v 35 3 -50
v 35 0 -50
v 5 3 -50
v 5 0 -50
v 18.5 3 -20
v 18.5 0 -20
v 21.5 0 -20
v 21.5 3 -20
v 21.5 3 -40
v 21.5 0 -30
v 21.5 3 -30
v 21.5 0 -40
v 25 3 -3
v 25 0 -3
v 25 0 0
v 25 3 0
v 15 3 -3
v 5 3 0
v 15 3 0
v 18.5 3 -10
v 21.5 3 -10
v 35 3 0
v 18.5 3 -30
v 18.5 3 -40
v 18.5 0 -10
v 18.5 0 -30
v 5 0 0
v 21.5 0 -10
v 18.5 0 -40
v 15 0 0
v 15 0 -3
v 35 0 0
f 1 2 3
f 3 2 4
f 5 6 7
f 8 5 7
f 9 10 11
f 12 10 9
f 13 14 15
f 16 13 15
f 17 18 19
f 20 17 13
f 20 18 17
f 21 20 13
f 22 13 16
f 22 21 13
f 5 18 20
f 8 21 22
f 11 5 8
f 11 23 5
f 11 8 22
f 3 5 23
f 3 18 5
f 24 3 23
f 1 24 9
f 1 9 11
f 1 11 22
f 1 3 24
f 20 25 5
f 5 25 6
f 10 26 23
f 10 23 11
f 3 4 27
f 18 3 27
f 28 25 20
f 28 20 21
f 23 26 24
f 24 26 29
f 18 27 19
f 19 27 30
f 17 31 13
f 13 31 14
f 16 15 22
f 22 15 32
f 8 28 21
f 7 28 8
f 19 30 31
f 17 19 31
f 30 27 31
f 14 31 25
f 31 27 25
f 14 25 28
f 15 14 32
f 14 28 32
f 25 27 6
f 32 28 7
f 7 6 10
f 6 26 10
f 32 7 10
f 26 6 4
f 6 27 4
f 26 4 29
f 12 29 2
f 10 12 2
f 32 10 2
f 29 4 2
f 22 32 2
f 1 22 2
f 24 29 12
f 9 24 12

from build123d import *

# Parameters (mm, degrees)
CROQUIS1_W              = 3
CROQUIS1_H              = 10
SALIENTE_EXTRUIR1_DEPTH = 3


with BuildPart() as part:
    # Croquis1 → Saliente-Extruir1 (new body)
    with BuildSketch(Plane(origin=(0, 0, 0), x_dir=(1, 0, 0), z_dir=(0, 1, 0))):
        Polygon((25, 0), (35, 0), (35, 50), (5, 50), (5, 0), (15, 0), (15, 3), (25, 3), align=None)
        with Locations((20, 15)):
            Rectangle(CROQUIS1_W, CROQUIS1_H, mode=Mode.SUBTRACT)
        with Locations((20, 35)):
            Rectangle(CROQUIS1_W, CROQUIS1_H, mode=Mode.SUBTRACT)
    extrude(amount=SALIENTE_EXTRUIR1_DEPTH)


solid = part.part
